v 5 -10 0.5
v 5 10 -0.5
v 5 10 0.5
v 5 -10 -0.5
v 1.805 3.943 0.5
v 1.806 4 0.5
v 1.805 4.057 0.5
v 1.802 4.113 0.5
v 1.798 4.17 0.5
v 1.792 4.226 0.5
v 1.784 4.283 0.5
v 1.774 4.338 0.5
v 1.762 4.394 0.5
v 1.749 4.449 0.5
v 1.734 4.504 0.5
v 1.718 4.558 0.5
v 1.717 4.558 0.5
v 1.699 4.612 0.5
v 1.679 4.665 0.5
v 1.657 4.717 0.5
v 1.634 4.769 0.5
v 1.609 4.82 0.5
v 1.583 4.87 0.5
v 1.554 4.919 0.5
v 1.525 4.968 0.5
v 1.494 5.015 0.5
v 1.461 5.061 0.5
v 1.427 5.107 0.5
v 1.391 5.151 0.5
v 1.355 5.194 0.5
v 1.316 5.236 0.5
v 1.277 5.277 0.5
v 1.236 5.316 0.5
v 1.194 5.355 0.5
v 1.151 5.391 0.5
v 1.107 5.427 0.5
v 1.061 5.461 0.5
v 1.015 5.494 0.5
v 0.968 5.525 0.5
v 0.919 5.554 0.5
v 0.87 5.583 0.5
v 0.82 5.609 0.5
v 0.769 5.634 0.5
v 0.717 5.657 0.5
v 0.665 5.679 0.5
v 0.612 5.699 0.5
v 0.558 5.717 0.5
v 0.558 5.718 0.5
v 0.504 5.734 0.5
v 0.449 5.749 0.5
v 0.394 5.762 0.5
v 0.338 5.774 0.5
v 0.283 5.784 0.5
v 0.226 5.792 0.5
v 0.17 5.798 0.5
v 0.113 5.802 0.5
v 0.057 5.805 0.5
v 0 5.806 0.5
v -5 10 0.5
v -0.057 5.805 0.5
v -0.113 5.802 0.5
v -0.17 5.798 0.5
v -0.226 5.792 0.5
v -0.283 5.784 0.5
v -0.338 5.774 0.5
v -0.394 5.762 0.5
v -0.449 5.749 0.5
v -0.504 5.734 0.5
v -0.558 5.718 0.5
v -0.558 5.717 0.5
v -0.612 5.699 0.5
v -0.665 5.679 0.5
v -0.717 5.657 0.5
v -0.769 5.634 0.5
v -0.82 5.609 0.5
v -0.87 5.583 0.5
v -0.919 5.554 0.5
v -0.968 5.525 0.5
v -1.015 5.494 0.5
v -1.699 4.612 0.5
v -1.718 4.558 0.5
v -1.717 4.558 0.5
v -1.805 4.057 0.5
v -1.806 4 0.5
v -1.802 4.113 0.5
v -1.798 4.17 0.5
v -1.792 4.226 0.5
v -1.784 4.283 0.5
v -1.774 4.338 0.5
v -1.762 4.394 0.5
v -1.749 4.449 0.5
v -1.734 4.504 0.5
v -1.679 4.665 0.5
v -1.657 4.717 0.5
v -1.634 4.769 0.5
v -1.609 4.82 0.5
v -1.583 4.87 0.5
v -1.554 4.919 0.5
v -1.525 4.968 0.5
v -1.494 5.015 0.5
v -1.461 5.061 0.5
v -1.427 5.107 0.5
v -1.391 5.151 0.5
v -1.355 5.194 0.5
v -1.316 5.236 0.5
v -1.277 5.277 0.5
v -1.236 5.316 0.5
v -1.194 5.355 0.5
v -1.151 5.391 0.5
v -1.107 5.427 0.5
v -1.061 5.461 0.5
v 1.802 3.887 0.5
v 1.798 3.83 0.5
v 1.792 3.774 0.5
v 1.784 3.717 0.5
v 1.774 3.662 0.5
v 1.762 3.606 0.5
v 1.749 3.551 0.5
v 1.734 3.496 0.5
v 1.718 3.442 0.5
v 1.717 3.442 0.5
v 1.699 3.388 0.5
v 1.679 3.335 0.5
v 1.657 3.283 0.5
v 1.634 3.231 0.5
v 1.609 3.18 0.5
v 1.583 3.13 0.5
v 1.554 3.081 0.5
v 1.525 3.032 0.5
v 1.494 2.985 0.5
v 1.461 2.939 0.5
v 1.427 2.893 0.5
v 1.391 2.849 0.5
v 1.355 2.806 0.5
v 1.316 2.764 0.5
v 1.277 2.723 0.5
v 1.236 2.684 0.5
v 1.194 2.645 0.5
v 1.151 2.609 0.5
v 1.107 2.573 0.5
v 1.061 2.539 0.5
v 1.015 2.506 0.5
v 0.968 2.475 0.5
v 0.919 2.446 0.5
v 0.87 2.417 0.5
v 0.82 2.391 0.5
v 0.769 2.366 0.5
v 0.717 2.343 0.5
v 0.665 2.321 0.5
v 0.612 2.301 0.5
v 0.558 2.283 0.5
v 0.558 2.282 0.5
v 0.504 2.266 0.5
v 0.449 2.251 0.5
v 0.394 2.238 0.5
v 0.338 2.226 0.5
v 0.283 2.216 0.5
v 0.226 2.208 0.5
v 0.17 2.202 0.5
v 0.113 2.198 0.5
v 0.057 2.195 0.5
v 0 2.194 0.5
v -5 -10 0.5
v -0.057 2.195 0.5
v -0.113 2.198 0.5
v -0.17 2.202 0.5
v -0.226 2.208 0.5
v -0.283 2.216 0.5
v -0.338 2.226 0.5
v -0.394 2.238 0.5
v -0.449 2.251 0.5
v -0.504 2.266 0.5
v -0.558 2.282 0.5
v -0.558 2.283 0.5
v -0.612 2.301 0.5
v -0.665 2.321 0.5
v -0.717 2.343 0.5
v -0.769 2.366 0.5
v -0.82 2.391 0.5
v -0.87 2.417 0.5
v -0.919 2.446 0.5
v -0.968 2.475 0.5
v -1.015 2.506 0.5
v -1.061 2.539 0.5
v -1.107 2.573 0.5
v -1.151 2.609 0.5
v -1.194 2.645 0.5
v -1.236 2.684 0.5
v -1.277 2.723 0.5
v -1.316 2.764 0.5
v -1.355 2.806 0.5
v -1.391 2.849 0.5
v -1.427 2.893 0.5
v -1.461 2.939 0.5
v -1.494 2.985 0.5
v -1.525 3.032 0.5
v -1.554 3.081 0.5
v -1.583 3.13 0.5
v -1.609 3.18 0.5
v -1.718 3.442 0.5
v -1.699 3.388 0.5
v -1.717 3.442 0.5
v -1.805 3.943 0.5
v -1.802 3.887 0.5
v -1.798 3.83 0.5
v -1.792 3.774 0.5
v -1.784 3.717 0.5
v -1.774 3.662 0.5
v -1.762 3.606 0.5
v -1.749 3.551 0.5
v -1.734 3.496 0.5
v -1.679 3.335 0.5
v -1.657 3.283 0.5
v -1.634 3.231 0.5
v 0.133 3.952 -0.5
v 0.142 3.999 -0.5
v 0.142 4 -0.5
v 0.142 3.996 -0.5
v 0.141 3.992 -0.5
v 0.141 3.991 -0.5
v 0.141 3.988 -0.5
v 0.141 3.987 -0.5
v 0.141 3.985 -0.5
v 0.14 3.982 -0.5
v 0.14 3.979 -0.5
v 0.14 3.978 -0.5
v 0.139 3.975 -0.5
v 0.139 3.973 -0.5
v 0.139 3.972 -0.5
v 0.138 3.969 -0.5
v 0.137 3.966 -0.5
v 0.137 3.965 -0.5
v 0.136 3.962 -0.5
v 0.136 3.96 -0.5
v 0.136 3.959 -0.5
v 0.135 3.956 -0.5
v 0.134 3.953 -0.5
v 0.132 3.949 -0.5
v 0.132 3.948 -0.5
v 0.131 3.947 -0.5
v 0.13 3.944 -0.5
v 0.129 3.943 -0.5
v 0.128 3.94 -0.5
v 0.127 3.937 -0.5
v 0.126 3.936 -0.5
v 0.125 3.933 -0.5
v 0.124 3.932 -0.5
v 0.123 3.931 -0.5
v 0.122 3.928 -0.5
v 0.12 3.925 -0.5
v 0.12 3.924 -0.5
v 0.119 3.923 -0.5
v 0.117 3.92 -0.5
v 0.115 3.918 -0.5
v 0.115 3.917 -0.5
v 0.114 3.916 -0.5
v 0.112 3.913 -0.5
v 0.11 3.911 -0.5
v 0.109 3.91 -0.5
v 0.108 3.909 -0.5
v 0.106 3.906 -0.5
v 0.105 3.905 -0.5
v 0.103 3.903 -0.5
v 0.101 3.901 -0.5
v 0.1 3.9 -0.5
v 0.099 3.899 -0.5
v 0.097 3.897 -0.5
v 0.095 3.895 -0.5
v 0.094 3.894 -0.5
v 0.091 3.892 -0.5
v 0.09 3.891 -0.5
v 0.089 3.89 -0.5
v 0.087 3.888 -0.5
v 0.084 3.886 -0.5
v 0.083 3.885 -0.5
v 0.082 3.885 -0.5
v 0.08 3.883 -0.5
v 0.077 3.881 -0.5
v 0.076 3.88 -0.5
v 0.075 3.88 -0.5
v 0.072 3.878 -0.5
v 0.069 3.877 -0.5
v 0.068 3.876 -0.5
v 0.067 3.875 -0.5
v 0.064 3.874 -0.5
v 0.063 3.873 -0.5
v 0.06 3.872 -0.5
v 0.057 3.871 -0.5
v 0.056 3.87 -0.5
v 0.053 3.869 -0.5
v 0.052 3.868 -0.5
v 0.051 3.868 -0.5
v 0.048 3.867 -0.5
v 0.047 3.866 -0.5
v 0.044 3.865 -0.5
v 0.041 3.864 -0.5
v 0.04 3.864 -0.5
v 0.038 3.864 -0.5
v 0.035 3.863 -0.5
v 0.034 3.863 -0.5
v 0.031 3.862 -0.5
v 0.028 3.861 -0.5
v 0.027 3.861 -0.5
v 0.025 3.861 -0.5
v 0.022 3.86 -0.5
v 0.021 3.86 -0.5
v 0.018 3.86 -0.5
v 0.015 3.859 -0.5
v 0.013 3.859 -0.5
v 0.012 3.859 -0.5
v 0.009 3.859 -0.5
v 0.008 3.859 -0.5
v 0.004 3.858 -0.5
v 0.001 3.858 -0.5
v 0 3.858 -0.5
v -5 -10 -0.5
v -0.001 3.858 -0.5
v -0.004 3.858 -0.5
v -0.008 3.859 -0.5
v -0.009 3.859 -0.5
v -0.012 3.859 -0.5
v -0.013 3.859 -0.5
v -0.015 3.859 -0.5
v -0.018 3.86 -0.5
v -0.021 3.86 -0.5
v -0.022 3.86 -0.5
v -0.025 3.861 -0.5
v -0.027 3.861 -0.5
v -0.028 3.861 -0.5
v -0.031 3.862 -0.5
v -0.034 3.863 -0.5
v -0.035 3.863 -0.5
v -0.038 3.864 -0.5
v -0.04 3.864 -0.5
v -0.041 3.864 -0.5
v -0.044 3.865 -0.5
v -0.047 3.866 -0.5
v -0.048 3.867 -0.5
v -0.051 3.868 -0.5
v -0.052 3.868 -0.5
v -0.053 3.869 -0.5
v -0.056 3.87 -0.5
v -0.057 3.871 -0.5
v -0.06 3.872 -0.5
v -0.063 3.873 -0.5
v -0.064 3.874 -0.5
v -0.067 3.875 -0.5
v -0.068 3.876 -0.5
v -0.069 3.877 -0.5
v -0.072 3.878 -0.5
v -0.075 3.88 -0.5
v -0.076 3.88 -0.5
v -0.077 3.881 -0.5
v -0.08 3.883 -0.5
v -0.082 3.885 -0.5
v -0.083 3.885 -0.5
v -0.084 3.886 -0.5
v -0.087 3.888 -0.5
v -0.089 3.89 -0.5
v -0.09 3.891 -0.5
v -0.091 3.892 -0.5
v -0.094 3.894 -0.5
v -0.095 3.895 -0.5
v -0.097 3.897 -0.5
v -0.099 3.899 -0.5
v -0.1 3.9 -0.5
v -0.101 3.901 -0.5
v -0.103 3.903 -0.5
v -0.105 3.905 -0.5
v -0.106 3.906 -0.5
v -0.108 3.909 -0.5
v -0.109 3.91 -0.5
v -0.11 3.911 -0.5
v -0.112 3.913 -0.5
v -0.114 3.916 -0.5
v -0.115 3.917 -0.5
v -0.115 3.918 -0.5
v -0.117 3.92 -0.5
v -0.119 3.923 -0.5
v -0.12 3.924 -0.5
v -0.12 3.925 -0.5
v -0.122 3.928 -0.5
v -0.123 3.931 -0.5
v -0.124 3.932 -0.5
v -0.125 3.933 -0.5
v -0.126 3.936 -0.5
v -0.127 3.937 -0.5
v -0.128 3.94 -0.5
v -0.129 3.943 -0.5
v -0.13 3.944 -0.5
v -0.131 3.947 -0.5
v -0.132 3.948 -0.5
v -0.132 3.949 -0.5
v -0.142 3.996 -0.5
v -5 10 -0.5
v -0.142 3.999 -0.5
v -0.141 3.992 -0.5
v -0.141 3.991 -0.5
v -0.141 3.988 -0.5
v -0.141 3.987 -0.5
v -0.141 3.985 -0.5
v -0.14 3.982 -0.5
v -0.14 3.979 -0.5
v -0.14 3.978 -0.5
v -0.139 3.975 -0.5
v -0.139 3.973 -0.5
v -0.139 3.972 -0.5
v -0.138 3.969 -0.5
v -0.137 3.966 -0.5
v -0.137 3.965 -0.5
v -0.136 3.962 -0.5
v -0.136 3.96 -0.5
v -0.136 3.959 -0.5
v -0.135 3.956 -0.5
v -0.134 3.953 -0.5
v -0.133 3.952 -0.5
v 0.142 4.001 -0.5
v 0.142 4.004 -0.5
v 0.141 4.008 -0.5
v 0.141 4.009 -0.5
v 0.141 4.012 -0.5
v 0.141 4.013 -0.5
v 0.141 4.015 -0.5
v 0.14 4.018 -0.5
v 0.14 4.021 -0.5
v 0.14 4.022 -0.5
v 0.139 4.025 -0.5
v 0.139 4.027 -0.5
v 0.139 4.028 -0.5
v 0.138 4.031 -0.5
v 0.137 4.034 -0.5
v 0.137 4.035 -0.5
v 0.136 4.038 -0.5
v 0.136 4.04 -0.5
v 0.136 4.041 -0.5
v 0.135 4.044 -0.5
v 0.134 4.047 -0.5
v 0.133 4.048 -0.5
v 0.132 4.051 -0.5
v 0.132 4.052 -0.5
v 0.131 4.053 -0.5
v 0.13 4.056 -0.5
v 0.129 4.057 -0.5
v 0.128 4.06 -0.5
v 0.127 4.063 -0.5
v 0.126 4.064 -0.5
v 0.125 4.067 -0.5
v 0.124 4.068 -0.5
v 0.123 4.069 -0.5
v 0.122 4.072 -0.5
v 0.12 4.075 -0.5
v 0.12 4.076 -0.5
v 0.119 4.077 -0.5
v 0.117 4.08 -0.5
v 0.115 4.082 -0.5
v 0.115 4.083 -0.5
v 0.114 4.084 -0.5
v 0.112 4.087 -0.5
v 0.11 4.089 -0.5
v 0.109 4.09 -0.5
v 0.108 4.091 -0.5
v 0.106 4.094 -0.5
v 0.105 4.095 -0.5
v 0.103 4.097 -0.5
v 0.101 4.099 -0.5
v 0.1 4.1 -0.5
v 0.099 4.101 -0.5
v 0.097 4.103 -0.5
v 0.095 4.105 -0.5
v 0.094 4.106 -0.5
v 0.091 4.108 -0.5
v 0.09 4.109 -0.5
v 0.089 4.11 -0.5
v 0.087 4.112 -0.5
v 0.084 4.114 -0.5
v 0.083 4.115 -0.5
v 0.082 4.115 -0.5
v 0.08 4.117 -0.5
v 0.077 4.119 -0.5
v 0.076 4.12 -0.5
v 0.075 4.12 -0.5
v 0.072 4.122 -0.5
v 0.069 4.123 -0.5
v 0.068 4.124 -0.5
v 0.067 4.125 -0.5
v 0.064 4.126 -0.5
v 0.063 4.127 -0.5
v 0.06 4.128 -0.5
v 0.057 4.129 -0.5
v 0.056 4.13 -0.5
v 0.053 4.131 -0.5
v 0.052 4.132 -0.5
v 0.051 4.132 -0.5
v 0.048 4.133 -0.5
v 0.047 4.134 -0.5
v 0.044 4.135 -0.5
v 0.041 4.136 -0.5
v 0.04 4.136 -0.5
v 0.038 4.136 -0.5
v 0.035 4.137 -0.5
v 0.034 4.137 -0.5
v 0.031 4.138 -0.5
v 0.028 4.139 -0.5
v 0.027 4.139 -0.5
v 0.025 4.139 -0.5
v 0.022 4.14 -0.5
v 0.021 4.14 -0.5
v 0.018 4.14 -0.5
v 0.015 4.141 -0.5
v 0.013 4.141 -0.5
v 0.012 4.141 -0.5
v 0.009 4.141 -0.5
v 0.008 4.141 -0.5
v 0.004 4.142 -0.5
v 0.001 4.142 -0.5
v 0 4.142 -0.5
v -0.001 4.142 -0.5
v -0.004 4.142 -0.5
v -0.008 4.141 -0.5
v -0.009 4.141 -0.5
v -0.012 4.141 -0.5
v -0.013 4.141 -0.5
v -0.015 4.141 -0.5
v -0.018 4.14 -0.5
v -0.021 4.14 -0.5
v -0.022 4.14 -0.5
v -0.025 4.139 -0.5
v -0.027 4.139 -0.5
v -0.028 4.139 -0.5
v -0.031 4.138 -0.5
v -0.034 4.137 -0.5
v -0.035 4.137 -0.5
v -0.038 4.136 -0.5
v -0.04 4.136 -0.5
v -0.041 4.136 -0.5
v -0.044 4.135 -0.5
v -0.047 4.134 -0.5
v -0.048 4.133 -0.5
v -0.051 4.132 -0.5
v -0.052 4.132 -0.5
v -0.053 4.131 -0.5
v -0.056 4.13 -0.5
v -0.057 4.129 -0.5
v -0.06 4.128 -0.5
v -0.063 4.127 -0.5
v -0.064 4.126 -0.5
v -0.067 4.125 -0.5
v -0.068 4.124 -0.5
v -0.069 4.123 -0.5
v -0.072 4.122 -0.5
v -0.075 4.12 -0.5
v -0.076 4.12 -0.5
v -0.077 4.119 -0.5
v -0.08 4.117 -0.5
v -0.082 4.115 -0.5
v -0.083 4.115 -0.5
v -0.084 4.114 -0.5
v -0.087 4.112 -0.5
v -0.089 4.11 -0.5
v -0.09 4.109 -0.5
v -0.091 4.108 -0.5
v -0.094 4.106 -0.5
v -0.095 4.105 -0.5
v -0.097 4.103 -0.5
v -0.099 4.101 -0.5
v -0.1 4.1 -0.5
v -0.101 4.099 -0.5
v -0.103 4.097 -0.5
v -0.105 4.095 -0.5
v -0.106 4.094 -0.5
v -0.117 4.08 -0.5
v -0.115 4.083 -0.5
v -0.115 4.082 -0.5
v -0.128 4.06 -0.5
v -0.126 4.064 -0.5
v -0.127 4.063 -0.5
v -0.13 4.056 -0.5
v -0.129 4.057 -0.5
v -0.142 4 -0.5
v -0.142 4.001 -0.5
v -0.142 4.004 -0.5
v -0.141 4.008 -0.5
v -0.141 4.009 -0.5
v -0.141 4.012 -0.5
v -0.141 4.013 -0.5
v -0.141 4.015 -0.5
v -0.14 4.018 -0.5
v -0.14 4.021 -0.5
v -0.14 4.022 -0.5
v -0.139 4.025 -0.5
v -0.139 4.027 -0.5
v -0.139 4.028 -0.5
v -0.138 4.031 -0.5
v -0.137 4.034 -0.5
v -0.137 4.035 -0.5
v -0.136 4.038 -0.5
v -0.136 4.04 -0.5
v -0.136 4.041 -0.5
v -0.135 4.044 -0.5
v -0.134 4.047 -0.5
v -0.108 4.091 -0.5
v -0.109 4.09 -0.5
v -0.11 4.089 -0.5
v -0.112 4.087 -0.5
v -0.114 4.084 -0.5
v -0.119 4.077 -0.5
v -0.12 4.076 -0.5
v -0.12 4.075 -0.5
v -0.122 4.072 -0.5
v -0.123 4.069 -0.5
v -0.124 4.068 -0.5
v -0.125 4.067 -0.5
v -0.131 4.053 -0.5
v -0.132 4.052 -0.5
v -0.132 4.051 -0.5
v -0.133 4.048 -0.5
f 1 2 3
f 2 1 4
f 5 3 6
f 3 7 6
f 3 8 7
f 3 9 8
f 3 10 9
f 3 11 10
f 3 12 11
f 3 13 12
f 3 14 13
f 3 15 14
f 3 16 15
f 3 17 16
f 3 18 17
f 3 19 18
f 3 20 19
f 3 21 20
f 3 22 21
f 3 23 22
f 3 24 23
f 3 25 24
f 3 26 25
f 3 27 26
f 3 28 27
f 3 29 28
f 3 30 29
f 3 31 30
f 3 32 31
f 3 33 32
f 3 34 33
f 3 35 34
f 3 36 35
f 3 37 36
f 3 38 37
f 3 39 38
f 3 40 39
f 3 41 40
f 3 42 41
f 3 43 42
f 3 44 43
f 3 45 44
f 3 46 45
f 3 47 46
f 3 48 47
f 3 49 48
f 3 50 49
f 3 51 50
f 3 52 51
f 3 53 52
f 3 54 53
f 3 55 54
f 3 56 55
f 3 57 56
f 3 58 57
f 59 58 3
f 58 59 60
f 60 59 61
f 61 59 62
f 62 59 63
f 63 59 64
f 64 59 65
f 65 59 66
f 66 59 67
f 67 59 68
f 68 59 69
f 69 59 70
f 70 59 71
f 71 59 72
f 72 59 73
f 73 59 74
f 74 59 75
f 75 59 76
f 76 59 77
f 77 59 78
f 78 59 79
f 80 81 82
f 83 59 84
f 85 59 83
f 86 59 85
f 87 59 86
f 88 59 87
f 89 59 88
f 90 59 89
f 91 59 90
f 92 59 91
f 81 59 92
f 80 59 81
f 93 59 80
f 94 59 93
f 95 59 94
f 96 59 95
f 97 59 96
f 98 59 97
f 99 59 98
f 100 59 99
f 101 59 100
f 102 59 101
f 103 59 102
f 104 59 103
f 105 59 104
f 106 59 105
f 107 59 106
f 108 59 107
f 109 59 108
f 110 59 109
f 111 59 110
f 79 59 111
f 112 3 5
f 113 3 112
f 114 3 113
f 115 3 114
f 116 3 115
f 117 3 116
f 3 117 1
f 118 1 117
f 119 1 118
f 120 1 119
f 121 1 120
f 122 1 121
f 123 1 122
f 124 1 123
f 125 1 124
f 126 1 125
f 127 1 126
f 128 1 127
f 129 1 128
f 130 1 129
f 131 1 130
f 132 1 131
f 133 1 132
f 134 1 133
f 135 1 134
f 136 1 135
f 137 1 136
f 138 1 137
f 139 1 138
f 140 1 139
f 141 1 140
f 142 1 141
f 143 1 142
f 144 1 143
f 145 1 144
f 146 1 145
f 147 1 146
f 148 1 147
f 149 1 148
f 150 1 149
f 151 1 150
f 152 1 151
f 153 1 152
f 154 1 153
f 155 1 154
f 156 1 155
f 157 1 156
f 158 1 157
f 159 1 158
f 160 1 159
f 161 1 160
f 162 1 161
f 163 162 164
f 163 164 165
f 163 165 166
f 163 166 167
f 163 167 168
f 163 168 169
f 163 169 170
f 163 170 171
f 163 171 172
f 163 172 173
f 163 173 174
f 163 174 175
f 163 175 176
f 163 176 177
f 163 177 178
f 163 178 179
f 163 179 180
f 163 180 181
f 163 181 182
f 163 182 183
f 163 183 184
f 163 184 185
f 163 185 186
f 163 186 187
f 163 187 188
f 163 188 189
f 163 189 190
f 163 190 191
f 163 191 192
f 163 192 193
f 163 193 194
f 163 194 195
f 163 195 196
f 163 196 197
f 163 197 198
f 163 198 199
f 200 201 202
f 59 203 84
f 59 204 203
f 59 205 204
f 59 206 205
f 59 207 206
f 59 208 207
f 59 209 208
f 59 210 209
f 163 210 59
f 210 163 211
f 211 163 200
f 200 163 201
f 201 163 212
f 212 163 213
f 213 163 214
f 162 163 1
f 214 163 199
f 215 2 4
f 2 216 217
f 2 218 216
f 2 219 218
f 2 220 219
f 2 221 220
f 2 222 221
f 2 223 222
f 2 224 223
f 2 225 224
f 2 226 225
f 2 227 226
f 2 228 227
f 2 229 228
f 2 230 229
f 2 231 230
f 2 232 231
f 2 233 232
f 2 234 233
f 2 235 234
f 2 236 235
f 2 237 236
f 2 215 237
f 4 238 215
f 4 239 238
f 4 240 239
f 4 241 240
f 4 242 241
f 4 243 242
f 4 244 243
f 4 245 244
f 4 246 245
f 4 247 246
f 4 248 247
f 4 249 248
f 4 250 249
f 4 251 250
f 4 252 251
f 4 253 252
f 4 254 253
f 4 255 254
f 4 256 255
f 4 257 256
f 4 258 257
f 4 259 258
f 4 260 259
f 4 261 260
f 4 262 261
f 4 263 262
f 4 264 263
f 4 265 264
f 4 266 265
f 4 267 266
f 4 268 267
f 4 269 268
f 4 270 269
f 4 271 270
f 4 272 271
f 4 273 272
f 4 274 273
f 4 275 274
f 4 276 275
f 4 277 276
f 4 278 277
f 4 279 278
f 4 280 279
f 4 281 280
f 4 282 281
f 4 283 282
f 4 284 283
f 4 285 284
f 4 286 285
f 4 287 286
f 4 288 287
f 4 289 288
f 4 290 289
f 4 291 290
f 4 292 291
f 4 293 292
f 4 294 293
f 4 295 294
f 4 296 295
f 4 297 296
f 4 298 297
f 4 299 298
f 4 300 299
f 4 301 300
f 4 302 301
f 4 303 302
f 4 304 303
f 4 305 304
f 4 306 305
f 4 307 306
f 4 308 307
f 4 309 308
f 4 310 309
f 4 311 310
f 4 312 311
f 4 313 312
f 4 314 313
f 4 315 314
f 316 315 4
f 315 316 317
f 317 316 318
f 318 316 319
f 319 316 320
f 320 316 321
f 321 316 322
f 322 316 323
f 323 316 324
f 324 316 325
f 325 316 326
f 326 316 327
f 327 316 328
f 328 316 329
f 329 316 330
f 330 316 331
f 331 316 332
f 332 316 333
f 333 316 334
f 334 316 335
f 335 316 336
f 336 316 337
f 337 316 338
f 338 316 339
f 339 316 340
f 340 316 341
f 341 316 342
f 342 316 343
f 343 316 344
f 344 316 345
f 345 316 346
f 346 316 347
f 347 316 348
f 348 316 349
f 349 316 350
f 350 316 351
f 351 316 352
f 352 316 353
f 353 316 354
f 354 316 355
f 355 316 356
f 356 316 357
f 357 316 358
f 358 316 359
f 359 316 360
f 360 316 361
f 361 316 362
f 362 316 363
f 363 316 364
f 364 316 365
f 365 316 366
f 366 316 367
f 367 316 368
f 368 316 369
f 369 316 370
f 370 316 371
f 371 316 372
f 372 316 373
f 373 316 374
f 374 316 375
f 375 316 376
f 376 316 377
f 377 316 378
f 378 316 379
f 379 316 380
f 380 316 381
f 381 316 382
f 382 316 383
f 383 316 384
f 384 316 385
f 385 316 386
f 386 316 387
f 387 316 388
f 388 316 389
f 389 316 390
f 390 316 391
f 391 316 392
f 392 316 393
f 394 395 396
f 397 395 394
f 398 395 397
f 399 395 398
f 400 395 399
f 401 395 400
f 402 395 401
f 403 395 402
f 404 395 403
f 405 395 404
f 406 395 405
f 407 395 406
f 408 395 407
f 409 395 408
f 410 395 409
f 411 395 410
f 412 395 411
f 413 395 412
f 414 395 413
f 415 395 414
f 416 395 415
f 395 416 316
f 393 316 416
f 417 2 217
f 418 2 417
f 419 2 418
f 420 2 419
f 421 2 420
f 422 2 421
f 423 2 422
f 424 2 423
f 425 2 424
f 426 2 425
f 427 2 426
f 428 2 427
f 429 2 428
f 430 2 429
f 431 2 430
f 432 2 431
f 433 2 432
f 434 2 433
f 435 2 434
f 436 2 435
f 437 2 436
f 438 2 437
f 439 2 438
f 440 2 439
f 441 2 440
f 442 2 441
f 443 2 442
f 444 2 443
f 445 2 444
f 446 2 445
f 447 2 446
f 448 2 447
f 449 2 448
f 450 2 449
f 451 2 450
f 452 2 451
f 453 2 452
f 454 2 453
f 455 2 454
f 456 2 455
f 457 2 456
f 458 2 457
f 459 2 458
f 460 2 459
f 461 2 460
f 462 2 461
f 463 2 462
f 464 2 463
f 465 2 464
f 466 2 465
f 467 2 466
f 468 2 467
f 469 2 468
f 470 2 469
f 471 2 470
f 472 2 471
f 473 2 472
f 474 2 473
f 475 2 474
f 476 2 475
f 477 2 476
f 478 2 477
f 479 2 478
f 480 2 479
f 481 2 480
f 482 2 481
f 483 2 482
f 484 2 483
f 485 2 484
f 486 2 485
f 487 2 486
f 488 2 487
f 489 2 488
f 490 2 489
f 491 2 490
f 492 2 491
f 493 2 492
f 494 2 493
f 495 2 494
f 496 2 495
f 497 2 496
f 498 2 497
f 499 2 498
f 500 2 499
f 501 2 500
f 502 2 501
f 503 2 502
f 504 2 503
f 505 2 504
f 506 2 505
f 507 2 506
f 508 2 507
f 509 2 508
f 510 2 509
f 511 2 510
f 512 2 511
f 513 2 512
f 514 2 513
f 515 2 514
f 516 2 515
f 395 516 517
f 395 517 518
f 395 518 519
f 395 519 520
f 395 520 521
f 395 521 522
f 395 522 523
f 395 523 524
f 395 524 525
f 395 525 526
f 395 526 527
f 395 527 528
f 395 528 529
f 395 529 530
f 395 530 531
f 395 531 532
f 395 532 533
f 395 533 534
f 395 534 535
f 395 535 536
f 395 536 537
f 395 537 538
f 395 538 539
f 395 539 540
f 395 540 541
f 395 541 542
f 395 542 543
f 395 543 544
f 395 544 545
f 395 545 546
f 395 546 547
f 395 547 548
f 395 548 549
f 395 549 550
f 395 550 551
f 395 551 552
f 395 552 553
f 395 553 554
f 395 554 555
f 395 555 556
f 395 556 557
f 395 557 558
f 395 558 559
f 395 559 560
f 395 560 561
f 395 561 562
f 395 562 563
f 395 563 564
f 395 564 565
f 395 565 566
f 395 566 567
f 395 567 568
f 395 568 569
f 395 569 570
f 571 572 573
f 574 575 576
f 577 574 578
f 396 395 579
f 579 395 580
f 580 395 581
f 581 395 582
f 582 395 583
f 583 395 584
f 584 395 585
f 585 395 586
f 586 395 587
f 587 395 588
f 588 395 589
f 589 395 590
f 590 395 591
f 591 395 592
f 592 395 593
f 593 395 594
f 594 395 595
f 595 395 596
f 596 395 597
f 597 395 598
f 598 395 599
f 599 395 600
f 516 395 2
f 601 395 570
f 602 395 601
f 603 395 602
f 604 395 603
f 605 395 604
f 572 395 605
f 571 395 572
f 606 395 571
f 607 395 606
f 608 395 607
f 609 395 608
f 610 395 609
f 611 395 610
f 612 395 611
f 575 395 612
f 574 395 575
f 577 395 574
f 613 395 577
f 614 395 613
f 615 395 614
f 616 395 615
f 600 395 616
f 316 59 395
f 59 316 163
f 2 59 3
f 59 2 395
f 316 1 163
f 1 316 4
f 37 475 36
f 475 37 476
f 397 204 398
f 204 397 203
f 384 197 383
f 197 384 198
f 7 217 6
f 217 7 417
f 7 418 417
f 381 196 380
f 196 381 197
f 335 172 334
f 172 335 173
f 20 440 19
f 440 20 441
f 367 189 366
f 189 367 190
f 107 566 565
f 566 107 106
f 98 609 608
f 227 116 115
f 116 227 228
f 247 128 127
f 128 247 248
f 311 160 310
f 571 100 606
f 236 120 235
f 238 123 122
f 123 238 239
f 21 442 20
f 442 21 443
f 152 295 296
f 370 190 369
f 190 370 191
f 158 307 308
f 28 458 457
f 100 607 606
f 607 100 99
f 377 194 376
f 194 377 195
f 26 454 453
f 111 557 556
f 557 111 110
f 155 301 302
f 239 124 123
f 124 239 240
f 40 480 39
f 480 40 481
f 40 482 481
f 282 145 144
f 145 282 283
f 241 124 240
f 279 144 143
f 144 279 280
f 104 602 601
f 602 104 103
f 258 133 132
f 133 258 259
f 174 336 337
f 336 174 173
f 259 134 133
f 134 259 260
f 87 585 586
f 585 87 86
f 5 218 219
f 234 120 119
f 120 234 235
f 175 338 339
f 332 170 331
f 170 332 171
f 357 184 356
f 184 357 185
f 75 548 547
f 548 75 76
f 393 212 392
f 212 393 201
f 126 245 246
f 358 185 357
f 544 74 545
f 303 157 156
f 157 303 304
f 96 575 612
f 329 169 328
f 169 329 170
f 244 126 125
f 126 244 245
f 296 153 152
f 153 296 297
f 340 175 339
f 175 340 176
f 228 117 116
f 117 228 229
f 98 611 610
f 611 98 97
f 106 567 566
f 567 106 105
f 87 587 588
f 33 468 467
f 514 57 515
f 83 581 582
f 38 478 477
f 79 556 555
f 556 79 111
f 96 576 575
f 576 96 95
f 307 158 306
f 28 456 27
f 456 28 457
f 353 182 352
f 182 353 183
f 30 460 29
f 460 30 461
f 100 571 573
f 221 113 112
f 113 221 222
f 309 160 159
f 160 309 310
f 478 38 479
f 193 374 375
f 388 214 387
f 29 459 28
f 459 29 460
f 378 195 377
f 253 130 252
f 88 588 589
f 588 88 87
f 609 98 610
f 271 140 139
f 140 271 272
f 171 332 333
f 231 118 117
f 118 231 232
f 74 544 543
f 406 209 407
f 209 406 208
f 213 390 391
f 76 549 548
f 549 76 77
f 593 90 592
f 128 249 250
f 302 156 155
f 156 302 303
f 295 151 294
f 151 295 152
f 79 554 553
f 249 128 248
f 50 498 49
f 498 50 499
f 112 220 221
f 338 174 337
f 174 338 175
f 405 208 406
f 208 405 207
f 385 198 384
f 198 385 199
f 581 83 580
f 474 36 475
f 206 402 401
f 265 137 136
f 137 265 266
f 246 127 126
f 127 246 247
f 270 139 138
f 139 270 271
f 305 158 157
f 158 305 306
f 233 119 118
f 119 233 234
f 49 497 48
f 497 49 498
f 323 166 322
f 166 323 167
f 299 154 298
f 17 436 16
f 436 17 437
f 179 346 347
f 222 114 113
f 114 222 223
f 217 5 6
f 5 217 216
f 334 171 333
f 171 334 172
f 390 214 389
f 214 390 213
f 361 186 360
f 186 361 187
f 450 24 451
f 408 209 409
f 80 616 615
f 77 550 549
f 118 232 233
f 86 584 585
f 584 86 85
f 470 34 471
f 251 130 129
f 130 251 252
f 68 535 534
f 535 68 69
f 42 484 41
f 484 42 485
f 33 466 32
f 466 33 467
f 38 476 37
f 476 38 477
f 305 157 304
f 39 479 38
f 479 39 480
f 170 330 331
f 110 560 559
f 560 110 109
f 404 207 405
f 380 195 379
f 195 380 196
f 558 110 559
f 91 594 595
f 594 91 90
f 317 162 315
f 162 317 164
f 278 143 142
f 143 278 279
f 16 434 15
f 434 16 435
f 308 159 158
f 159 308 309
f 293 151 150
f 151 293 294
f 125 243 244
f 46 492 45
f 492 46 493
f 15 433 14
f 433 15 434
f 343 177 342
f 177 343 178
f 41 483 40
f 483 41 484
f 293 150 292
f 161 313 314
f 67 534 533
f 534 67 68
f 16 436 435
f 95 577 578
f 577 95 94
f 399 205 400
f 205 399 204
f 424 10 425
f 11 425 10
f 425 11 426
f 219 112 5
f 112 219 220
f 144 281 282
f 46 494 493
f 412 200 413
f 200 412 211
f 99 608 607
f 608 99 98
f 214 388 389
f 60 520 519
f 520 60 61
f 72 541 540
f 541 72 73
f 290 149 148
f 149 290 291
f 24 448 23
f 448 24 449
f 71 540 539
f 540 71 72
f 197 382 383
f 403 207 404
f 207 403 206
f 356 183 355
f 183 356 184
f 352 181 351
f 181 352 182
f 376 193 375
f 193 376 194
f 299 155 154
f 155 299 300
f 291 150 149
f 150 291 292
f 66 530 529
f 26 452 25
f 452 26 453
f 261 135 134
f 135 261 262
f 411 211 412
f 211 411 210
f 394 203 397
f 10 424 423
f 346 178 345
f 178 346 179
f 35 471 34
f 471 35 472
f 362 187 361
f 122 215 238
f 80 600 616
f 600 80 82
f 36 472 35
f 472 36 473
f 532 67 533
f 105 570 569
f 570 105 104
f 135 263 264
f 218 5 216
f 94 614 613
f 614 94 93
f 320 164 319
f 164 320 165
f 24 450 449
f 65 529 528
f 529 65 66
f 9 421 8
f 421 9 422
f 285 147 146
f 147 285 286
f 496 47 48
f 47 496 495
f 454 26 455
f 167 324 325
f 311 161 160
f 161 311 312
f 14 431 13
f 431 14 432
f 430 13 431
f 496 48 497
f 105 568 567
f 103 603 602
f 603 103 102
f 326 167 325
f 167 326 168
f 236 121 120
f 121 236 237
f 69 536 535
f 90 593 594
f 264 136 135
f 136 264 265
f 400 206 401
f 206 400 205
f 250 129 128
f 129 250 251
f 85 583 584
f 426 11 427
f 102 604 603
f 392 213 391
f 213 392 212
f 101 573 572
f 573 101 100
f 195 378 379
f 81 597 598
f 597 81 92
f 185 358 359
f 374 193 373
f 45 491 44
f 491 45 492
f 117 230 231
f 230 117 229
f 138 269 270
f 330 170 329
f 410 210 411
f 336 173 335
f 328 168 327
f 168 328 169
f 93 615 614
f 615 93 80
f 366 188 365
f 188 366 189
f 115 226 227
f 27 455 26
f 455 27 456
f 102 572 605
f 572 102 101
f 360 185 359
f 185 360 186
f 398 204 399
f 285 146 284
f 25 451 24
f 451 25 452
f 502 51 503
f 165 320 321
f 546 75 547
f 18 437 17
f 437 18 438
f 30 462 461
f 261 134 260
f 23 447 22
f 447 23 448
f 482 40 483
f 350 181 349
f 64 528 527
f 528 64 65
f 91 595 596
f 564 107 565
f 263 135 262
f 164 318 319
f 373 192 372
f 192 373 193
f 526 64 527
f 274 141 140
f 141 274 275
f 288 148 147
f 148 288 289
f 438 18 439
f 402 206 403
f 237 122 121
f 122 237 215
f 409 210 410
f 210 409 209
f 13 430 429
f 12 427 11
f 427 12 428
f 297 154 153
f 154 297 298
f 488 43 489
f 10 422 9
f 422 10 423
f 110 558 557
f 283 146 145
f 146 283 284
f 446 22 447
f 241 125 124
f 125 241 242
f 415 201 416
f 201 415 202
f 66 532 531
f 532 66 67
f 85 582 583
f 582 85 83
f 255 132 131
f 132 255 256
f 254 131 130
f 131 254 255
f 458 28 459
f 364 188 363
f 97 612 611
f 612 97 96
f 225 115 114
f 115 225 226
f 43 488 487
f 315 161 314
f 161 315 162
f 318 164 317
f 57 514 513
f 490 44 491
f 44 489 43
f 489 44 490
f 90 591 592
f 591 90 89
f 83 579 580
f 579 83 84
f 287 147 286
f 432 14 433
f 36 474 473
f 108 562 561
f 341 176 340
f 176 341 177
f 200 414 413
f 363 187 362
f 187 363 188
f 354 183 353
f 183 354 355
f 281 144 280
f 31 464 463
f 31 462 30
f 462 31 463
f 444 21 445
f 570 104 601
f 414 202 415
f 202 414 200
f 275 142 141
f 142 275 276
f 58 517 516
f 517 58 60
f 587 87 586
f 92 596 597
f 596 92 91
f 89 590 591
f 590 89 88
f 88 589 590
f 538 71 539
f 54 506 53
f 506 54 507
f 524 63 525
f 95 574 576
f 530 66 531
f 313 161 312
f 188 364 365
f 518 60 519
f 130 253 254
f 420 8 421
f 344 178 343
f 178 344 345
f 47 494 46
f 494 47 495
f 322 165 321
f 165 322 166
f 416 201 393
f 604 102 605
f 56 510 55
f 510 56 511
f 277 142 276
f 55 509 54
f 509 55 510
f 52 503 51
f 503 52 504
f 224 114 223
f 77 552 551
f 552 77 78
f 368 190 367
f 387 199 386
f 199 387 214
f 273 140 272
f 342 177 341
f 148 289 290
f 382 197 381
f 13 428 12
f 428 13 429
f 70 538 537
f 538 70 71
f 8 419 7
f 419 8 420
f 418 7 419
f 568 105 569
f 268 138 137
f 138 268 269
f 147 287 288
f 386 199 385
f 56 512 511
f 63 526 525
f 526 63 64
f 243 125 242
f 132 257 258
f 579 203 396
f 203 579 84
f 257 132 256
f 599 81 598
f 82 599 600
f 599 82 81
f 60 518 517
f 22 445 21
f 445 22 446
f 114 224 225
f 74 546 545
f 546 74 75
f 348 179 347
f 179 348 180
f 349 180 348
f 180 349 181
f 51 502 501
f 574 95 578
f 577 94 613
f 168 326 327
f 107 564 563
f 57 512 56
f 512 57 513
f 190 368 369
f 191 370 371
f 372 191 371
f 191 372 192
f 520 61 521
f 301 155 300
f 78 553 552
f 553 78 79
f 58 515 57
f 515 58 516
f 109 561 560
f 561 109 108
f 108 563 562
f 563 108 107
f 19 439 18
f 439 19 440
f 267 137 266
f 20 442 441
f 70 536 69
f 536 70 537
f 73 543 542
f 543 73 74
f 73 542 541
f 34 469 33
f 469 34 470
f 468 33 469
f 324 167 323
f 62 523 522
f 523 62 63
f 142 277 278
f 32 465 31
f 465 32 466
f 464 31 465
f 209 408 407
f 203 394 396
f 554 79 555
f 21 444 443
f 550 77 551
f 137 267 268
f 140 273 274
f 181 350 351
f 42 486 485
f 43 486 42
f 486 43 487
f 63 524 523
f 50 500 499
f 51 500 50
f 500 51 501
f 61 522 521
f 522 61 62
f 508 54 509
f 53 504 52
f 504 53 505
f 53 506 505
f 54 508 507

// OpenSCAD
use <../../libs/illumination.scad>

condenser_aperture_8mm_stl();

module condenser_aperture_8mm_stl(){
    condenser_aperture(led_size=8);
}
